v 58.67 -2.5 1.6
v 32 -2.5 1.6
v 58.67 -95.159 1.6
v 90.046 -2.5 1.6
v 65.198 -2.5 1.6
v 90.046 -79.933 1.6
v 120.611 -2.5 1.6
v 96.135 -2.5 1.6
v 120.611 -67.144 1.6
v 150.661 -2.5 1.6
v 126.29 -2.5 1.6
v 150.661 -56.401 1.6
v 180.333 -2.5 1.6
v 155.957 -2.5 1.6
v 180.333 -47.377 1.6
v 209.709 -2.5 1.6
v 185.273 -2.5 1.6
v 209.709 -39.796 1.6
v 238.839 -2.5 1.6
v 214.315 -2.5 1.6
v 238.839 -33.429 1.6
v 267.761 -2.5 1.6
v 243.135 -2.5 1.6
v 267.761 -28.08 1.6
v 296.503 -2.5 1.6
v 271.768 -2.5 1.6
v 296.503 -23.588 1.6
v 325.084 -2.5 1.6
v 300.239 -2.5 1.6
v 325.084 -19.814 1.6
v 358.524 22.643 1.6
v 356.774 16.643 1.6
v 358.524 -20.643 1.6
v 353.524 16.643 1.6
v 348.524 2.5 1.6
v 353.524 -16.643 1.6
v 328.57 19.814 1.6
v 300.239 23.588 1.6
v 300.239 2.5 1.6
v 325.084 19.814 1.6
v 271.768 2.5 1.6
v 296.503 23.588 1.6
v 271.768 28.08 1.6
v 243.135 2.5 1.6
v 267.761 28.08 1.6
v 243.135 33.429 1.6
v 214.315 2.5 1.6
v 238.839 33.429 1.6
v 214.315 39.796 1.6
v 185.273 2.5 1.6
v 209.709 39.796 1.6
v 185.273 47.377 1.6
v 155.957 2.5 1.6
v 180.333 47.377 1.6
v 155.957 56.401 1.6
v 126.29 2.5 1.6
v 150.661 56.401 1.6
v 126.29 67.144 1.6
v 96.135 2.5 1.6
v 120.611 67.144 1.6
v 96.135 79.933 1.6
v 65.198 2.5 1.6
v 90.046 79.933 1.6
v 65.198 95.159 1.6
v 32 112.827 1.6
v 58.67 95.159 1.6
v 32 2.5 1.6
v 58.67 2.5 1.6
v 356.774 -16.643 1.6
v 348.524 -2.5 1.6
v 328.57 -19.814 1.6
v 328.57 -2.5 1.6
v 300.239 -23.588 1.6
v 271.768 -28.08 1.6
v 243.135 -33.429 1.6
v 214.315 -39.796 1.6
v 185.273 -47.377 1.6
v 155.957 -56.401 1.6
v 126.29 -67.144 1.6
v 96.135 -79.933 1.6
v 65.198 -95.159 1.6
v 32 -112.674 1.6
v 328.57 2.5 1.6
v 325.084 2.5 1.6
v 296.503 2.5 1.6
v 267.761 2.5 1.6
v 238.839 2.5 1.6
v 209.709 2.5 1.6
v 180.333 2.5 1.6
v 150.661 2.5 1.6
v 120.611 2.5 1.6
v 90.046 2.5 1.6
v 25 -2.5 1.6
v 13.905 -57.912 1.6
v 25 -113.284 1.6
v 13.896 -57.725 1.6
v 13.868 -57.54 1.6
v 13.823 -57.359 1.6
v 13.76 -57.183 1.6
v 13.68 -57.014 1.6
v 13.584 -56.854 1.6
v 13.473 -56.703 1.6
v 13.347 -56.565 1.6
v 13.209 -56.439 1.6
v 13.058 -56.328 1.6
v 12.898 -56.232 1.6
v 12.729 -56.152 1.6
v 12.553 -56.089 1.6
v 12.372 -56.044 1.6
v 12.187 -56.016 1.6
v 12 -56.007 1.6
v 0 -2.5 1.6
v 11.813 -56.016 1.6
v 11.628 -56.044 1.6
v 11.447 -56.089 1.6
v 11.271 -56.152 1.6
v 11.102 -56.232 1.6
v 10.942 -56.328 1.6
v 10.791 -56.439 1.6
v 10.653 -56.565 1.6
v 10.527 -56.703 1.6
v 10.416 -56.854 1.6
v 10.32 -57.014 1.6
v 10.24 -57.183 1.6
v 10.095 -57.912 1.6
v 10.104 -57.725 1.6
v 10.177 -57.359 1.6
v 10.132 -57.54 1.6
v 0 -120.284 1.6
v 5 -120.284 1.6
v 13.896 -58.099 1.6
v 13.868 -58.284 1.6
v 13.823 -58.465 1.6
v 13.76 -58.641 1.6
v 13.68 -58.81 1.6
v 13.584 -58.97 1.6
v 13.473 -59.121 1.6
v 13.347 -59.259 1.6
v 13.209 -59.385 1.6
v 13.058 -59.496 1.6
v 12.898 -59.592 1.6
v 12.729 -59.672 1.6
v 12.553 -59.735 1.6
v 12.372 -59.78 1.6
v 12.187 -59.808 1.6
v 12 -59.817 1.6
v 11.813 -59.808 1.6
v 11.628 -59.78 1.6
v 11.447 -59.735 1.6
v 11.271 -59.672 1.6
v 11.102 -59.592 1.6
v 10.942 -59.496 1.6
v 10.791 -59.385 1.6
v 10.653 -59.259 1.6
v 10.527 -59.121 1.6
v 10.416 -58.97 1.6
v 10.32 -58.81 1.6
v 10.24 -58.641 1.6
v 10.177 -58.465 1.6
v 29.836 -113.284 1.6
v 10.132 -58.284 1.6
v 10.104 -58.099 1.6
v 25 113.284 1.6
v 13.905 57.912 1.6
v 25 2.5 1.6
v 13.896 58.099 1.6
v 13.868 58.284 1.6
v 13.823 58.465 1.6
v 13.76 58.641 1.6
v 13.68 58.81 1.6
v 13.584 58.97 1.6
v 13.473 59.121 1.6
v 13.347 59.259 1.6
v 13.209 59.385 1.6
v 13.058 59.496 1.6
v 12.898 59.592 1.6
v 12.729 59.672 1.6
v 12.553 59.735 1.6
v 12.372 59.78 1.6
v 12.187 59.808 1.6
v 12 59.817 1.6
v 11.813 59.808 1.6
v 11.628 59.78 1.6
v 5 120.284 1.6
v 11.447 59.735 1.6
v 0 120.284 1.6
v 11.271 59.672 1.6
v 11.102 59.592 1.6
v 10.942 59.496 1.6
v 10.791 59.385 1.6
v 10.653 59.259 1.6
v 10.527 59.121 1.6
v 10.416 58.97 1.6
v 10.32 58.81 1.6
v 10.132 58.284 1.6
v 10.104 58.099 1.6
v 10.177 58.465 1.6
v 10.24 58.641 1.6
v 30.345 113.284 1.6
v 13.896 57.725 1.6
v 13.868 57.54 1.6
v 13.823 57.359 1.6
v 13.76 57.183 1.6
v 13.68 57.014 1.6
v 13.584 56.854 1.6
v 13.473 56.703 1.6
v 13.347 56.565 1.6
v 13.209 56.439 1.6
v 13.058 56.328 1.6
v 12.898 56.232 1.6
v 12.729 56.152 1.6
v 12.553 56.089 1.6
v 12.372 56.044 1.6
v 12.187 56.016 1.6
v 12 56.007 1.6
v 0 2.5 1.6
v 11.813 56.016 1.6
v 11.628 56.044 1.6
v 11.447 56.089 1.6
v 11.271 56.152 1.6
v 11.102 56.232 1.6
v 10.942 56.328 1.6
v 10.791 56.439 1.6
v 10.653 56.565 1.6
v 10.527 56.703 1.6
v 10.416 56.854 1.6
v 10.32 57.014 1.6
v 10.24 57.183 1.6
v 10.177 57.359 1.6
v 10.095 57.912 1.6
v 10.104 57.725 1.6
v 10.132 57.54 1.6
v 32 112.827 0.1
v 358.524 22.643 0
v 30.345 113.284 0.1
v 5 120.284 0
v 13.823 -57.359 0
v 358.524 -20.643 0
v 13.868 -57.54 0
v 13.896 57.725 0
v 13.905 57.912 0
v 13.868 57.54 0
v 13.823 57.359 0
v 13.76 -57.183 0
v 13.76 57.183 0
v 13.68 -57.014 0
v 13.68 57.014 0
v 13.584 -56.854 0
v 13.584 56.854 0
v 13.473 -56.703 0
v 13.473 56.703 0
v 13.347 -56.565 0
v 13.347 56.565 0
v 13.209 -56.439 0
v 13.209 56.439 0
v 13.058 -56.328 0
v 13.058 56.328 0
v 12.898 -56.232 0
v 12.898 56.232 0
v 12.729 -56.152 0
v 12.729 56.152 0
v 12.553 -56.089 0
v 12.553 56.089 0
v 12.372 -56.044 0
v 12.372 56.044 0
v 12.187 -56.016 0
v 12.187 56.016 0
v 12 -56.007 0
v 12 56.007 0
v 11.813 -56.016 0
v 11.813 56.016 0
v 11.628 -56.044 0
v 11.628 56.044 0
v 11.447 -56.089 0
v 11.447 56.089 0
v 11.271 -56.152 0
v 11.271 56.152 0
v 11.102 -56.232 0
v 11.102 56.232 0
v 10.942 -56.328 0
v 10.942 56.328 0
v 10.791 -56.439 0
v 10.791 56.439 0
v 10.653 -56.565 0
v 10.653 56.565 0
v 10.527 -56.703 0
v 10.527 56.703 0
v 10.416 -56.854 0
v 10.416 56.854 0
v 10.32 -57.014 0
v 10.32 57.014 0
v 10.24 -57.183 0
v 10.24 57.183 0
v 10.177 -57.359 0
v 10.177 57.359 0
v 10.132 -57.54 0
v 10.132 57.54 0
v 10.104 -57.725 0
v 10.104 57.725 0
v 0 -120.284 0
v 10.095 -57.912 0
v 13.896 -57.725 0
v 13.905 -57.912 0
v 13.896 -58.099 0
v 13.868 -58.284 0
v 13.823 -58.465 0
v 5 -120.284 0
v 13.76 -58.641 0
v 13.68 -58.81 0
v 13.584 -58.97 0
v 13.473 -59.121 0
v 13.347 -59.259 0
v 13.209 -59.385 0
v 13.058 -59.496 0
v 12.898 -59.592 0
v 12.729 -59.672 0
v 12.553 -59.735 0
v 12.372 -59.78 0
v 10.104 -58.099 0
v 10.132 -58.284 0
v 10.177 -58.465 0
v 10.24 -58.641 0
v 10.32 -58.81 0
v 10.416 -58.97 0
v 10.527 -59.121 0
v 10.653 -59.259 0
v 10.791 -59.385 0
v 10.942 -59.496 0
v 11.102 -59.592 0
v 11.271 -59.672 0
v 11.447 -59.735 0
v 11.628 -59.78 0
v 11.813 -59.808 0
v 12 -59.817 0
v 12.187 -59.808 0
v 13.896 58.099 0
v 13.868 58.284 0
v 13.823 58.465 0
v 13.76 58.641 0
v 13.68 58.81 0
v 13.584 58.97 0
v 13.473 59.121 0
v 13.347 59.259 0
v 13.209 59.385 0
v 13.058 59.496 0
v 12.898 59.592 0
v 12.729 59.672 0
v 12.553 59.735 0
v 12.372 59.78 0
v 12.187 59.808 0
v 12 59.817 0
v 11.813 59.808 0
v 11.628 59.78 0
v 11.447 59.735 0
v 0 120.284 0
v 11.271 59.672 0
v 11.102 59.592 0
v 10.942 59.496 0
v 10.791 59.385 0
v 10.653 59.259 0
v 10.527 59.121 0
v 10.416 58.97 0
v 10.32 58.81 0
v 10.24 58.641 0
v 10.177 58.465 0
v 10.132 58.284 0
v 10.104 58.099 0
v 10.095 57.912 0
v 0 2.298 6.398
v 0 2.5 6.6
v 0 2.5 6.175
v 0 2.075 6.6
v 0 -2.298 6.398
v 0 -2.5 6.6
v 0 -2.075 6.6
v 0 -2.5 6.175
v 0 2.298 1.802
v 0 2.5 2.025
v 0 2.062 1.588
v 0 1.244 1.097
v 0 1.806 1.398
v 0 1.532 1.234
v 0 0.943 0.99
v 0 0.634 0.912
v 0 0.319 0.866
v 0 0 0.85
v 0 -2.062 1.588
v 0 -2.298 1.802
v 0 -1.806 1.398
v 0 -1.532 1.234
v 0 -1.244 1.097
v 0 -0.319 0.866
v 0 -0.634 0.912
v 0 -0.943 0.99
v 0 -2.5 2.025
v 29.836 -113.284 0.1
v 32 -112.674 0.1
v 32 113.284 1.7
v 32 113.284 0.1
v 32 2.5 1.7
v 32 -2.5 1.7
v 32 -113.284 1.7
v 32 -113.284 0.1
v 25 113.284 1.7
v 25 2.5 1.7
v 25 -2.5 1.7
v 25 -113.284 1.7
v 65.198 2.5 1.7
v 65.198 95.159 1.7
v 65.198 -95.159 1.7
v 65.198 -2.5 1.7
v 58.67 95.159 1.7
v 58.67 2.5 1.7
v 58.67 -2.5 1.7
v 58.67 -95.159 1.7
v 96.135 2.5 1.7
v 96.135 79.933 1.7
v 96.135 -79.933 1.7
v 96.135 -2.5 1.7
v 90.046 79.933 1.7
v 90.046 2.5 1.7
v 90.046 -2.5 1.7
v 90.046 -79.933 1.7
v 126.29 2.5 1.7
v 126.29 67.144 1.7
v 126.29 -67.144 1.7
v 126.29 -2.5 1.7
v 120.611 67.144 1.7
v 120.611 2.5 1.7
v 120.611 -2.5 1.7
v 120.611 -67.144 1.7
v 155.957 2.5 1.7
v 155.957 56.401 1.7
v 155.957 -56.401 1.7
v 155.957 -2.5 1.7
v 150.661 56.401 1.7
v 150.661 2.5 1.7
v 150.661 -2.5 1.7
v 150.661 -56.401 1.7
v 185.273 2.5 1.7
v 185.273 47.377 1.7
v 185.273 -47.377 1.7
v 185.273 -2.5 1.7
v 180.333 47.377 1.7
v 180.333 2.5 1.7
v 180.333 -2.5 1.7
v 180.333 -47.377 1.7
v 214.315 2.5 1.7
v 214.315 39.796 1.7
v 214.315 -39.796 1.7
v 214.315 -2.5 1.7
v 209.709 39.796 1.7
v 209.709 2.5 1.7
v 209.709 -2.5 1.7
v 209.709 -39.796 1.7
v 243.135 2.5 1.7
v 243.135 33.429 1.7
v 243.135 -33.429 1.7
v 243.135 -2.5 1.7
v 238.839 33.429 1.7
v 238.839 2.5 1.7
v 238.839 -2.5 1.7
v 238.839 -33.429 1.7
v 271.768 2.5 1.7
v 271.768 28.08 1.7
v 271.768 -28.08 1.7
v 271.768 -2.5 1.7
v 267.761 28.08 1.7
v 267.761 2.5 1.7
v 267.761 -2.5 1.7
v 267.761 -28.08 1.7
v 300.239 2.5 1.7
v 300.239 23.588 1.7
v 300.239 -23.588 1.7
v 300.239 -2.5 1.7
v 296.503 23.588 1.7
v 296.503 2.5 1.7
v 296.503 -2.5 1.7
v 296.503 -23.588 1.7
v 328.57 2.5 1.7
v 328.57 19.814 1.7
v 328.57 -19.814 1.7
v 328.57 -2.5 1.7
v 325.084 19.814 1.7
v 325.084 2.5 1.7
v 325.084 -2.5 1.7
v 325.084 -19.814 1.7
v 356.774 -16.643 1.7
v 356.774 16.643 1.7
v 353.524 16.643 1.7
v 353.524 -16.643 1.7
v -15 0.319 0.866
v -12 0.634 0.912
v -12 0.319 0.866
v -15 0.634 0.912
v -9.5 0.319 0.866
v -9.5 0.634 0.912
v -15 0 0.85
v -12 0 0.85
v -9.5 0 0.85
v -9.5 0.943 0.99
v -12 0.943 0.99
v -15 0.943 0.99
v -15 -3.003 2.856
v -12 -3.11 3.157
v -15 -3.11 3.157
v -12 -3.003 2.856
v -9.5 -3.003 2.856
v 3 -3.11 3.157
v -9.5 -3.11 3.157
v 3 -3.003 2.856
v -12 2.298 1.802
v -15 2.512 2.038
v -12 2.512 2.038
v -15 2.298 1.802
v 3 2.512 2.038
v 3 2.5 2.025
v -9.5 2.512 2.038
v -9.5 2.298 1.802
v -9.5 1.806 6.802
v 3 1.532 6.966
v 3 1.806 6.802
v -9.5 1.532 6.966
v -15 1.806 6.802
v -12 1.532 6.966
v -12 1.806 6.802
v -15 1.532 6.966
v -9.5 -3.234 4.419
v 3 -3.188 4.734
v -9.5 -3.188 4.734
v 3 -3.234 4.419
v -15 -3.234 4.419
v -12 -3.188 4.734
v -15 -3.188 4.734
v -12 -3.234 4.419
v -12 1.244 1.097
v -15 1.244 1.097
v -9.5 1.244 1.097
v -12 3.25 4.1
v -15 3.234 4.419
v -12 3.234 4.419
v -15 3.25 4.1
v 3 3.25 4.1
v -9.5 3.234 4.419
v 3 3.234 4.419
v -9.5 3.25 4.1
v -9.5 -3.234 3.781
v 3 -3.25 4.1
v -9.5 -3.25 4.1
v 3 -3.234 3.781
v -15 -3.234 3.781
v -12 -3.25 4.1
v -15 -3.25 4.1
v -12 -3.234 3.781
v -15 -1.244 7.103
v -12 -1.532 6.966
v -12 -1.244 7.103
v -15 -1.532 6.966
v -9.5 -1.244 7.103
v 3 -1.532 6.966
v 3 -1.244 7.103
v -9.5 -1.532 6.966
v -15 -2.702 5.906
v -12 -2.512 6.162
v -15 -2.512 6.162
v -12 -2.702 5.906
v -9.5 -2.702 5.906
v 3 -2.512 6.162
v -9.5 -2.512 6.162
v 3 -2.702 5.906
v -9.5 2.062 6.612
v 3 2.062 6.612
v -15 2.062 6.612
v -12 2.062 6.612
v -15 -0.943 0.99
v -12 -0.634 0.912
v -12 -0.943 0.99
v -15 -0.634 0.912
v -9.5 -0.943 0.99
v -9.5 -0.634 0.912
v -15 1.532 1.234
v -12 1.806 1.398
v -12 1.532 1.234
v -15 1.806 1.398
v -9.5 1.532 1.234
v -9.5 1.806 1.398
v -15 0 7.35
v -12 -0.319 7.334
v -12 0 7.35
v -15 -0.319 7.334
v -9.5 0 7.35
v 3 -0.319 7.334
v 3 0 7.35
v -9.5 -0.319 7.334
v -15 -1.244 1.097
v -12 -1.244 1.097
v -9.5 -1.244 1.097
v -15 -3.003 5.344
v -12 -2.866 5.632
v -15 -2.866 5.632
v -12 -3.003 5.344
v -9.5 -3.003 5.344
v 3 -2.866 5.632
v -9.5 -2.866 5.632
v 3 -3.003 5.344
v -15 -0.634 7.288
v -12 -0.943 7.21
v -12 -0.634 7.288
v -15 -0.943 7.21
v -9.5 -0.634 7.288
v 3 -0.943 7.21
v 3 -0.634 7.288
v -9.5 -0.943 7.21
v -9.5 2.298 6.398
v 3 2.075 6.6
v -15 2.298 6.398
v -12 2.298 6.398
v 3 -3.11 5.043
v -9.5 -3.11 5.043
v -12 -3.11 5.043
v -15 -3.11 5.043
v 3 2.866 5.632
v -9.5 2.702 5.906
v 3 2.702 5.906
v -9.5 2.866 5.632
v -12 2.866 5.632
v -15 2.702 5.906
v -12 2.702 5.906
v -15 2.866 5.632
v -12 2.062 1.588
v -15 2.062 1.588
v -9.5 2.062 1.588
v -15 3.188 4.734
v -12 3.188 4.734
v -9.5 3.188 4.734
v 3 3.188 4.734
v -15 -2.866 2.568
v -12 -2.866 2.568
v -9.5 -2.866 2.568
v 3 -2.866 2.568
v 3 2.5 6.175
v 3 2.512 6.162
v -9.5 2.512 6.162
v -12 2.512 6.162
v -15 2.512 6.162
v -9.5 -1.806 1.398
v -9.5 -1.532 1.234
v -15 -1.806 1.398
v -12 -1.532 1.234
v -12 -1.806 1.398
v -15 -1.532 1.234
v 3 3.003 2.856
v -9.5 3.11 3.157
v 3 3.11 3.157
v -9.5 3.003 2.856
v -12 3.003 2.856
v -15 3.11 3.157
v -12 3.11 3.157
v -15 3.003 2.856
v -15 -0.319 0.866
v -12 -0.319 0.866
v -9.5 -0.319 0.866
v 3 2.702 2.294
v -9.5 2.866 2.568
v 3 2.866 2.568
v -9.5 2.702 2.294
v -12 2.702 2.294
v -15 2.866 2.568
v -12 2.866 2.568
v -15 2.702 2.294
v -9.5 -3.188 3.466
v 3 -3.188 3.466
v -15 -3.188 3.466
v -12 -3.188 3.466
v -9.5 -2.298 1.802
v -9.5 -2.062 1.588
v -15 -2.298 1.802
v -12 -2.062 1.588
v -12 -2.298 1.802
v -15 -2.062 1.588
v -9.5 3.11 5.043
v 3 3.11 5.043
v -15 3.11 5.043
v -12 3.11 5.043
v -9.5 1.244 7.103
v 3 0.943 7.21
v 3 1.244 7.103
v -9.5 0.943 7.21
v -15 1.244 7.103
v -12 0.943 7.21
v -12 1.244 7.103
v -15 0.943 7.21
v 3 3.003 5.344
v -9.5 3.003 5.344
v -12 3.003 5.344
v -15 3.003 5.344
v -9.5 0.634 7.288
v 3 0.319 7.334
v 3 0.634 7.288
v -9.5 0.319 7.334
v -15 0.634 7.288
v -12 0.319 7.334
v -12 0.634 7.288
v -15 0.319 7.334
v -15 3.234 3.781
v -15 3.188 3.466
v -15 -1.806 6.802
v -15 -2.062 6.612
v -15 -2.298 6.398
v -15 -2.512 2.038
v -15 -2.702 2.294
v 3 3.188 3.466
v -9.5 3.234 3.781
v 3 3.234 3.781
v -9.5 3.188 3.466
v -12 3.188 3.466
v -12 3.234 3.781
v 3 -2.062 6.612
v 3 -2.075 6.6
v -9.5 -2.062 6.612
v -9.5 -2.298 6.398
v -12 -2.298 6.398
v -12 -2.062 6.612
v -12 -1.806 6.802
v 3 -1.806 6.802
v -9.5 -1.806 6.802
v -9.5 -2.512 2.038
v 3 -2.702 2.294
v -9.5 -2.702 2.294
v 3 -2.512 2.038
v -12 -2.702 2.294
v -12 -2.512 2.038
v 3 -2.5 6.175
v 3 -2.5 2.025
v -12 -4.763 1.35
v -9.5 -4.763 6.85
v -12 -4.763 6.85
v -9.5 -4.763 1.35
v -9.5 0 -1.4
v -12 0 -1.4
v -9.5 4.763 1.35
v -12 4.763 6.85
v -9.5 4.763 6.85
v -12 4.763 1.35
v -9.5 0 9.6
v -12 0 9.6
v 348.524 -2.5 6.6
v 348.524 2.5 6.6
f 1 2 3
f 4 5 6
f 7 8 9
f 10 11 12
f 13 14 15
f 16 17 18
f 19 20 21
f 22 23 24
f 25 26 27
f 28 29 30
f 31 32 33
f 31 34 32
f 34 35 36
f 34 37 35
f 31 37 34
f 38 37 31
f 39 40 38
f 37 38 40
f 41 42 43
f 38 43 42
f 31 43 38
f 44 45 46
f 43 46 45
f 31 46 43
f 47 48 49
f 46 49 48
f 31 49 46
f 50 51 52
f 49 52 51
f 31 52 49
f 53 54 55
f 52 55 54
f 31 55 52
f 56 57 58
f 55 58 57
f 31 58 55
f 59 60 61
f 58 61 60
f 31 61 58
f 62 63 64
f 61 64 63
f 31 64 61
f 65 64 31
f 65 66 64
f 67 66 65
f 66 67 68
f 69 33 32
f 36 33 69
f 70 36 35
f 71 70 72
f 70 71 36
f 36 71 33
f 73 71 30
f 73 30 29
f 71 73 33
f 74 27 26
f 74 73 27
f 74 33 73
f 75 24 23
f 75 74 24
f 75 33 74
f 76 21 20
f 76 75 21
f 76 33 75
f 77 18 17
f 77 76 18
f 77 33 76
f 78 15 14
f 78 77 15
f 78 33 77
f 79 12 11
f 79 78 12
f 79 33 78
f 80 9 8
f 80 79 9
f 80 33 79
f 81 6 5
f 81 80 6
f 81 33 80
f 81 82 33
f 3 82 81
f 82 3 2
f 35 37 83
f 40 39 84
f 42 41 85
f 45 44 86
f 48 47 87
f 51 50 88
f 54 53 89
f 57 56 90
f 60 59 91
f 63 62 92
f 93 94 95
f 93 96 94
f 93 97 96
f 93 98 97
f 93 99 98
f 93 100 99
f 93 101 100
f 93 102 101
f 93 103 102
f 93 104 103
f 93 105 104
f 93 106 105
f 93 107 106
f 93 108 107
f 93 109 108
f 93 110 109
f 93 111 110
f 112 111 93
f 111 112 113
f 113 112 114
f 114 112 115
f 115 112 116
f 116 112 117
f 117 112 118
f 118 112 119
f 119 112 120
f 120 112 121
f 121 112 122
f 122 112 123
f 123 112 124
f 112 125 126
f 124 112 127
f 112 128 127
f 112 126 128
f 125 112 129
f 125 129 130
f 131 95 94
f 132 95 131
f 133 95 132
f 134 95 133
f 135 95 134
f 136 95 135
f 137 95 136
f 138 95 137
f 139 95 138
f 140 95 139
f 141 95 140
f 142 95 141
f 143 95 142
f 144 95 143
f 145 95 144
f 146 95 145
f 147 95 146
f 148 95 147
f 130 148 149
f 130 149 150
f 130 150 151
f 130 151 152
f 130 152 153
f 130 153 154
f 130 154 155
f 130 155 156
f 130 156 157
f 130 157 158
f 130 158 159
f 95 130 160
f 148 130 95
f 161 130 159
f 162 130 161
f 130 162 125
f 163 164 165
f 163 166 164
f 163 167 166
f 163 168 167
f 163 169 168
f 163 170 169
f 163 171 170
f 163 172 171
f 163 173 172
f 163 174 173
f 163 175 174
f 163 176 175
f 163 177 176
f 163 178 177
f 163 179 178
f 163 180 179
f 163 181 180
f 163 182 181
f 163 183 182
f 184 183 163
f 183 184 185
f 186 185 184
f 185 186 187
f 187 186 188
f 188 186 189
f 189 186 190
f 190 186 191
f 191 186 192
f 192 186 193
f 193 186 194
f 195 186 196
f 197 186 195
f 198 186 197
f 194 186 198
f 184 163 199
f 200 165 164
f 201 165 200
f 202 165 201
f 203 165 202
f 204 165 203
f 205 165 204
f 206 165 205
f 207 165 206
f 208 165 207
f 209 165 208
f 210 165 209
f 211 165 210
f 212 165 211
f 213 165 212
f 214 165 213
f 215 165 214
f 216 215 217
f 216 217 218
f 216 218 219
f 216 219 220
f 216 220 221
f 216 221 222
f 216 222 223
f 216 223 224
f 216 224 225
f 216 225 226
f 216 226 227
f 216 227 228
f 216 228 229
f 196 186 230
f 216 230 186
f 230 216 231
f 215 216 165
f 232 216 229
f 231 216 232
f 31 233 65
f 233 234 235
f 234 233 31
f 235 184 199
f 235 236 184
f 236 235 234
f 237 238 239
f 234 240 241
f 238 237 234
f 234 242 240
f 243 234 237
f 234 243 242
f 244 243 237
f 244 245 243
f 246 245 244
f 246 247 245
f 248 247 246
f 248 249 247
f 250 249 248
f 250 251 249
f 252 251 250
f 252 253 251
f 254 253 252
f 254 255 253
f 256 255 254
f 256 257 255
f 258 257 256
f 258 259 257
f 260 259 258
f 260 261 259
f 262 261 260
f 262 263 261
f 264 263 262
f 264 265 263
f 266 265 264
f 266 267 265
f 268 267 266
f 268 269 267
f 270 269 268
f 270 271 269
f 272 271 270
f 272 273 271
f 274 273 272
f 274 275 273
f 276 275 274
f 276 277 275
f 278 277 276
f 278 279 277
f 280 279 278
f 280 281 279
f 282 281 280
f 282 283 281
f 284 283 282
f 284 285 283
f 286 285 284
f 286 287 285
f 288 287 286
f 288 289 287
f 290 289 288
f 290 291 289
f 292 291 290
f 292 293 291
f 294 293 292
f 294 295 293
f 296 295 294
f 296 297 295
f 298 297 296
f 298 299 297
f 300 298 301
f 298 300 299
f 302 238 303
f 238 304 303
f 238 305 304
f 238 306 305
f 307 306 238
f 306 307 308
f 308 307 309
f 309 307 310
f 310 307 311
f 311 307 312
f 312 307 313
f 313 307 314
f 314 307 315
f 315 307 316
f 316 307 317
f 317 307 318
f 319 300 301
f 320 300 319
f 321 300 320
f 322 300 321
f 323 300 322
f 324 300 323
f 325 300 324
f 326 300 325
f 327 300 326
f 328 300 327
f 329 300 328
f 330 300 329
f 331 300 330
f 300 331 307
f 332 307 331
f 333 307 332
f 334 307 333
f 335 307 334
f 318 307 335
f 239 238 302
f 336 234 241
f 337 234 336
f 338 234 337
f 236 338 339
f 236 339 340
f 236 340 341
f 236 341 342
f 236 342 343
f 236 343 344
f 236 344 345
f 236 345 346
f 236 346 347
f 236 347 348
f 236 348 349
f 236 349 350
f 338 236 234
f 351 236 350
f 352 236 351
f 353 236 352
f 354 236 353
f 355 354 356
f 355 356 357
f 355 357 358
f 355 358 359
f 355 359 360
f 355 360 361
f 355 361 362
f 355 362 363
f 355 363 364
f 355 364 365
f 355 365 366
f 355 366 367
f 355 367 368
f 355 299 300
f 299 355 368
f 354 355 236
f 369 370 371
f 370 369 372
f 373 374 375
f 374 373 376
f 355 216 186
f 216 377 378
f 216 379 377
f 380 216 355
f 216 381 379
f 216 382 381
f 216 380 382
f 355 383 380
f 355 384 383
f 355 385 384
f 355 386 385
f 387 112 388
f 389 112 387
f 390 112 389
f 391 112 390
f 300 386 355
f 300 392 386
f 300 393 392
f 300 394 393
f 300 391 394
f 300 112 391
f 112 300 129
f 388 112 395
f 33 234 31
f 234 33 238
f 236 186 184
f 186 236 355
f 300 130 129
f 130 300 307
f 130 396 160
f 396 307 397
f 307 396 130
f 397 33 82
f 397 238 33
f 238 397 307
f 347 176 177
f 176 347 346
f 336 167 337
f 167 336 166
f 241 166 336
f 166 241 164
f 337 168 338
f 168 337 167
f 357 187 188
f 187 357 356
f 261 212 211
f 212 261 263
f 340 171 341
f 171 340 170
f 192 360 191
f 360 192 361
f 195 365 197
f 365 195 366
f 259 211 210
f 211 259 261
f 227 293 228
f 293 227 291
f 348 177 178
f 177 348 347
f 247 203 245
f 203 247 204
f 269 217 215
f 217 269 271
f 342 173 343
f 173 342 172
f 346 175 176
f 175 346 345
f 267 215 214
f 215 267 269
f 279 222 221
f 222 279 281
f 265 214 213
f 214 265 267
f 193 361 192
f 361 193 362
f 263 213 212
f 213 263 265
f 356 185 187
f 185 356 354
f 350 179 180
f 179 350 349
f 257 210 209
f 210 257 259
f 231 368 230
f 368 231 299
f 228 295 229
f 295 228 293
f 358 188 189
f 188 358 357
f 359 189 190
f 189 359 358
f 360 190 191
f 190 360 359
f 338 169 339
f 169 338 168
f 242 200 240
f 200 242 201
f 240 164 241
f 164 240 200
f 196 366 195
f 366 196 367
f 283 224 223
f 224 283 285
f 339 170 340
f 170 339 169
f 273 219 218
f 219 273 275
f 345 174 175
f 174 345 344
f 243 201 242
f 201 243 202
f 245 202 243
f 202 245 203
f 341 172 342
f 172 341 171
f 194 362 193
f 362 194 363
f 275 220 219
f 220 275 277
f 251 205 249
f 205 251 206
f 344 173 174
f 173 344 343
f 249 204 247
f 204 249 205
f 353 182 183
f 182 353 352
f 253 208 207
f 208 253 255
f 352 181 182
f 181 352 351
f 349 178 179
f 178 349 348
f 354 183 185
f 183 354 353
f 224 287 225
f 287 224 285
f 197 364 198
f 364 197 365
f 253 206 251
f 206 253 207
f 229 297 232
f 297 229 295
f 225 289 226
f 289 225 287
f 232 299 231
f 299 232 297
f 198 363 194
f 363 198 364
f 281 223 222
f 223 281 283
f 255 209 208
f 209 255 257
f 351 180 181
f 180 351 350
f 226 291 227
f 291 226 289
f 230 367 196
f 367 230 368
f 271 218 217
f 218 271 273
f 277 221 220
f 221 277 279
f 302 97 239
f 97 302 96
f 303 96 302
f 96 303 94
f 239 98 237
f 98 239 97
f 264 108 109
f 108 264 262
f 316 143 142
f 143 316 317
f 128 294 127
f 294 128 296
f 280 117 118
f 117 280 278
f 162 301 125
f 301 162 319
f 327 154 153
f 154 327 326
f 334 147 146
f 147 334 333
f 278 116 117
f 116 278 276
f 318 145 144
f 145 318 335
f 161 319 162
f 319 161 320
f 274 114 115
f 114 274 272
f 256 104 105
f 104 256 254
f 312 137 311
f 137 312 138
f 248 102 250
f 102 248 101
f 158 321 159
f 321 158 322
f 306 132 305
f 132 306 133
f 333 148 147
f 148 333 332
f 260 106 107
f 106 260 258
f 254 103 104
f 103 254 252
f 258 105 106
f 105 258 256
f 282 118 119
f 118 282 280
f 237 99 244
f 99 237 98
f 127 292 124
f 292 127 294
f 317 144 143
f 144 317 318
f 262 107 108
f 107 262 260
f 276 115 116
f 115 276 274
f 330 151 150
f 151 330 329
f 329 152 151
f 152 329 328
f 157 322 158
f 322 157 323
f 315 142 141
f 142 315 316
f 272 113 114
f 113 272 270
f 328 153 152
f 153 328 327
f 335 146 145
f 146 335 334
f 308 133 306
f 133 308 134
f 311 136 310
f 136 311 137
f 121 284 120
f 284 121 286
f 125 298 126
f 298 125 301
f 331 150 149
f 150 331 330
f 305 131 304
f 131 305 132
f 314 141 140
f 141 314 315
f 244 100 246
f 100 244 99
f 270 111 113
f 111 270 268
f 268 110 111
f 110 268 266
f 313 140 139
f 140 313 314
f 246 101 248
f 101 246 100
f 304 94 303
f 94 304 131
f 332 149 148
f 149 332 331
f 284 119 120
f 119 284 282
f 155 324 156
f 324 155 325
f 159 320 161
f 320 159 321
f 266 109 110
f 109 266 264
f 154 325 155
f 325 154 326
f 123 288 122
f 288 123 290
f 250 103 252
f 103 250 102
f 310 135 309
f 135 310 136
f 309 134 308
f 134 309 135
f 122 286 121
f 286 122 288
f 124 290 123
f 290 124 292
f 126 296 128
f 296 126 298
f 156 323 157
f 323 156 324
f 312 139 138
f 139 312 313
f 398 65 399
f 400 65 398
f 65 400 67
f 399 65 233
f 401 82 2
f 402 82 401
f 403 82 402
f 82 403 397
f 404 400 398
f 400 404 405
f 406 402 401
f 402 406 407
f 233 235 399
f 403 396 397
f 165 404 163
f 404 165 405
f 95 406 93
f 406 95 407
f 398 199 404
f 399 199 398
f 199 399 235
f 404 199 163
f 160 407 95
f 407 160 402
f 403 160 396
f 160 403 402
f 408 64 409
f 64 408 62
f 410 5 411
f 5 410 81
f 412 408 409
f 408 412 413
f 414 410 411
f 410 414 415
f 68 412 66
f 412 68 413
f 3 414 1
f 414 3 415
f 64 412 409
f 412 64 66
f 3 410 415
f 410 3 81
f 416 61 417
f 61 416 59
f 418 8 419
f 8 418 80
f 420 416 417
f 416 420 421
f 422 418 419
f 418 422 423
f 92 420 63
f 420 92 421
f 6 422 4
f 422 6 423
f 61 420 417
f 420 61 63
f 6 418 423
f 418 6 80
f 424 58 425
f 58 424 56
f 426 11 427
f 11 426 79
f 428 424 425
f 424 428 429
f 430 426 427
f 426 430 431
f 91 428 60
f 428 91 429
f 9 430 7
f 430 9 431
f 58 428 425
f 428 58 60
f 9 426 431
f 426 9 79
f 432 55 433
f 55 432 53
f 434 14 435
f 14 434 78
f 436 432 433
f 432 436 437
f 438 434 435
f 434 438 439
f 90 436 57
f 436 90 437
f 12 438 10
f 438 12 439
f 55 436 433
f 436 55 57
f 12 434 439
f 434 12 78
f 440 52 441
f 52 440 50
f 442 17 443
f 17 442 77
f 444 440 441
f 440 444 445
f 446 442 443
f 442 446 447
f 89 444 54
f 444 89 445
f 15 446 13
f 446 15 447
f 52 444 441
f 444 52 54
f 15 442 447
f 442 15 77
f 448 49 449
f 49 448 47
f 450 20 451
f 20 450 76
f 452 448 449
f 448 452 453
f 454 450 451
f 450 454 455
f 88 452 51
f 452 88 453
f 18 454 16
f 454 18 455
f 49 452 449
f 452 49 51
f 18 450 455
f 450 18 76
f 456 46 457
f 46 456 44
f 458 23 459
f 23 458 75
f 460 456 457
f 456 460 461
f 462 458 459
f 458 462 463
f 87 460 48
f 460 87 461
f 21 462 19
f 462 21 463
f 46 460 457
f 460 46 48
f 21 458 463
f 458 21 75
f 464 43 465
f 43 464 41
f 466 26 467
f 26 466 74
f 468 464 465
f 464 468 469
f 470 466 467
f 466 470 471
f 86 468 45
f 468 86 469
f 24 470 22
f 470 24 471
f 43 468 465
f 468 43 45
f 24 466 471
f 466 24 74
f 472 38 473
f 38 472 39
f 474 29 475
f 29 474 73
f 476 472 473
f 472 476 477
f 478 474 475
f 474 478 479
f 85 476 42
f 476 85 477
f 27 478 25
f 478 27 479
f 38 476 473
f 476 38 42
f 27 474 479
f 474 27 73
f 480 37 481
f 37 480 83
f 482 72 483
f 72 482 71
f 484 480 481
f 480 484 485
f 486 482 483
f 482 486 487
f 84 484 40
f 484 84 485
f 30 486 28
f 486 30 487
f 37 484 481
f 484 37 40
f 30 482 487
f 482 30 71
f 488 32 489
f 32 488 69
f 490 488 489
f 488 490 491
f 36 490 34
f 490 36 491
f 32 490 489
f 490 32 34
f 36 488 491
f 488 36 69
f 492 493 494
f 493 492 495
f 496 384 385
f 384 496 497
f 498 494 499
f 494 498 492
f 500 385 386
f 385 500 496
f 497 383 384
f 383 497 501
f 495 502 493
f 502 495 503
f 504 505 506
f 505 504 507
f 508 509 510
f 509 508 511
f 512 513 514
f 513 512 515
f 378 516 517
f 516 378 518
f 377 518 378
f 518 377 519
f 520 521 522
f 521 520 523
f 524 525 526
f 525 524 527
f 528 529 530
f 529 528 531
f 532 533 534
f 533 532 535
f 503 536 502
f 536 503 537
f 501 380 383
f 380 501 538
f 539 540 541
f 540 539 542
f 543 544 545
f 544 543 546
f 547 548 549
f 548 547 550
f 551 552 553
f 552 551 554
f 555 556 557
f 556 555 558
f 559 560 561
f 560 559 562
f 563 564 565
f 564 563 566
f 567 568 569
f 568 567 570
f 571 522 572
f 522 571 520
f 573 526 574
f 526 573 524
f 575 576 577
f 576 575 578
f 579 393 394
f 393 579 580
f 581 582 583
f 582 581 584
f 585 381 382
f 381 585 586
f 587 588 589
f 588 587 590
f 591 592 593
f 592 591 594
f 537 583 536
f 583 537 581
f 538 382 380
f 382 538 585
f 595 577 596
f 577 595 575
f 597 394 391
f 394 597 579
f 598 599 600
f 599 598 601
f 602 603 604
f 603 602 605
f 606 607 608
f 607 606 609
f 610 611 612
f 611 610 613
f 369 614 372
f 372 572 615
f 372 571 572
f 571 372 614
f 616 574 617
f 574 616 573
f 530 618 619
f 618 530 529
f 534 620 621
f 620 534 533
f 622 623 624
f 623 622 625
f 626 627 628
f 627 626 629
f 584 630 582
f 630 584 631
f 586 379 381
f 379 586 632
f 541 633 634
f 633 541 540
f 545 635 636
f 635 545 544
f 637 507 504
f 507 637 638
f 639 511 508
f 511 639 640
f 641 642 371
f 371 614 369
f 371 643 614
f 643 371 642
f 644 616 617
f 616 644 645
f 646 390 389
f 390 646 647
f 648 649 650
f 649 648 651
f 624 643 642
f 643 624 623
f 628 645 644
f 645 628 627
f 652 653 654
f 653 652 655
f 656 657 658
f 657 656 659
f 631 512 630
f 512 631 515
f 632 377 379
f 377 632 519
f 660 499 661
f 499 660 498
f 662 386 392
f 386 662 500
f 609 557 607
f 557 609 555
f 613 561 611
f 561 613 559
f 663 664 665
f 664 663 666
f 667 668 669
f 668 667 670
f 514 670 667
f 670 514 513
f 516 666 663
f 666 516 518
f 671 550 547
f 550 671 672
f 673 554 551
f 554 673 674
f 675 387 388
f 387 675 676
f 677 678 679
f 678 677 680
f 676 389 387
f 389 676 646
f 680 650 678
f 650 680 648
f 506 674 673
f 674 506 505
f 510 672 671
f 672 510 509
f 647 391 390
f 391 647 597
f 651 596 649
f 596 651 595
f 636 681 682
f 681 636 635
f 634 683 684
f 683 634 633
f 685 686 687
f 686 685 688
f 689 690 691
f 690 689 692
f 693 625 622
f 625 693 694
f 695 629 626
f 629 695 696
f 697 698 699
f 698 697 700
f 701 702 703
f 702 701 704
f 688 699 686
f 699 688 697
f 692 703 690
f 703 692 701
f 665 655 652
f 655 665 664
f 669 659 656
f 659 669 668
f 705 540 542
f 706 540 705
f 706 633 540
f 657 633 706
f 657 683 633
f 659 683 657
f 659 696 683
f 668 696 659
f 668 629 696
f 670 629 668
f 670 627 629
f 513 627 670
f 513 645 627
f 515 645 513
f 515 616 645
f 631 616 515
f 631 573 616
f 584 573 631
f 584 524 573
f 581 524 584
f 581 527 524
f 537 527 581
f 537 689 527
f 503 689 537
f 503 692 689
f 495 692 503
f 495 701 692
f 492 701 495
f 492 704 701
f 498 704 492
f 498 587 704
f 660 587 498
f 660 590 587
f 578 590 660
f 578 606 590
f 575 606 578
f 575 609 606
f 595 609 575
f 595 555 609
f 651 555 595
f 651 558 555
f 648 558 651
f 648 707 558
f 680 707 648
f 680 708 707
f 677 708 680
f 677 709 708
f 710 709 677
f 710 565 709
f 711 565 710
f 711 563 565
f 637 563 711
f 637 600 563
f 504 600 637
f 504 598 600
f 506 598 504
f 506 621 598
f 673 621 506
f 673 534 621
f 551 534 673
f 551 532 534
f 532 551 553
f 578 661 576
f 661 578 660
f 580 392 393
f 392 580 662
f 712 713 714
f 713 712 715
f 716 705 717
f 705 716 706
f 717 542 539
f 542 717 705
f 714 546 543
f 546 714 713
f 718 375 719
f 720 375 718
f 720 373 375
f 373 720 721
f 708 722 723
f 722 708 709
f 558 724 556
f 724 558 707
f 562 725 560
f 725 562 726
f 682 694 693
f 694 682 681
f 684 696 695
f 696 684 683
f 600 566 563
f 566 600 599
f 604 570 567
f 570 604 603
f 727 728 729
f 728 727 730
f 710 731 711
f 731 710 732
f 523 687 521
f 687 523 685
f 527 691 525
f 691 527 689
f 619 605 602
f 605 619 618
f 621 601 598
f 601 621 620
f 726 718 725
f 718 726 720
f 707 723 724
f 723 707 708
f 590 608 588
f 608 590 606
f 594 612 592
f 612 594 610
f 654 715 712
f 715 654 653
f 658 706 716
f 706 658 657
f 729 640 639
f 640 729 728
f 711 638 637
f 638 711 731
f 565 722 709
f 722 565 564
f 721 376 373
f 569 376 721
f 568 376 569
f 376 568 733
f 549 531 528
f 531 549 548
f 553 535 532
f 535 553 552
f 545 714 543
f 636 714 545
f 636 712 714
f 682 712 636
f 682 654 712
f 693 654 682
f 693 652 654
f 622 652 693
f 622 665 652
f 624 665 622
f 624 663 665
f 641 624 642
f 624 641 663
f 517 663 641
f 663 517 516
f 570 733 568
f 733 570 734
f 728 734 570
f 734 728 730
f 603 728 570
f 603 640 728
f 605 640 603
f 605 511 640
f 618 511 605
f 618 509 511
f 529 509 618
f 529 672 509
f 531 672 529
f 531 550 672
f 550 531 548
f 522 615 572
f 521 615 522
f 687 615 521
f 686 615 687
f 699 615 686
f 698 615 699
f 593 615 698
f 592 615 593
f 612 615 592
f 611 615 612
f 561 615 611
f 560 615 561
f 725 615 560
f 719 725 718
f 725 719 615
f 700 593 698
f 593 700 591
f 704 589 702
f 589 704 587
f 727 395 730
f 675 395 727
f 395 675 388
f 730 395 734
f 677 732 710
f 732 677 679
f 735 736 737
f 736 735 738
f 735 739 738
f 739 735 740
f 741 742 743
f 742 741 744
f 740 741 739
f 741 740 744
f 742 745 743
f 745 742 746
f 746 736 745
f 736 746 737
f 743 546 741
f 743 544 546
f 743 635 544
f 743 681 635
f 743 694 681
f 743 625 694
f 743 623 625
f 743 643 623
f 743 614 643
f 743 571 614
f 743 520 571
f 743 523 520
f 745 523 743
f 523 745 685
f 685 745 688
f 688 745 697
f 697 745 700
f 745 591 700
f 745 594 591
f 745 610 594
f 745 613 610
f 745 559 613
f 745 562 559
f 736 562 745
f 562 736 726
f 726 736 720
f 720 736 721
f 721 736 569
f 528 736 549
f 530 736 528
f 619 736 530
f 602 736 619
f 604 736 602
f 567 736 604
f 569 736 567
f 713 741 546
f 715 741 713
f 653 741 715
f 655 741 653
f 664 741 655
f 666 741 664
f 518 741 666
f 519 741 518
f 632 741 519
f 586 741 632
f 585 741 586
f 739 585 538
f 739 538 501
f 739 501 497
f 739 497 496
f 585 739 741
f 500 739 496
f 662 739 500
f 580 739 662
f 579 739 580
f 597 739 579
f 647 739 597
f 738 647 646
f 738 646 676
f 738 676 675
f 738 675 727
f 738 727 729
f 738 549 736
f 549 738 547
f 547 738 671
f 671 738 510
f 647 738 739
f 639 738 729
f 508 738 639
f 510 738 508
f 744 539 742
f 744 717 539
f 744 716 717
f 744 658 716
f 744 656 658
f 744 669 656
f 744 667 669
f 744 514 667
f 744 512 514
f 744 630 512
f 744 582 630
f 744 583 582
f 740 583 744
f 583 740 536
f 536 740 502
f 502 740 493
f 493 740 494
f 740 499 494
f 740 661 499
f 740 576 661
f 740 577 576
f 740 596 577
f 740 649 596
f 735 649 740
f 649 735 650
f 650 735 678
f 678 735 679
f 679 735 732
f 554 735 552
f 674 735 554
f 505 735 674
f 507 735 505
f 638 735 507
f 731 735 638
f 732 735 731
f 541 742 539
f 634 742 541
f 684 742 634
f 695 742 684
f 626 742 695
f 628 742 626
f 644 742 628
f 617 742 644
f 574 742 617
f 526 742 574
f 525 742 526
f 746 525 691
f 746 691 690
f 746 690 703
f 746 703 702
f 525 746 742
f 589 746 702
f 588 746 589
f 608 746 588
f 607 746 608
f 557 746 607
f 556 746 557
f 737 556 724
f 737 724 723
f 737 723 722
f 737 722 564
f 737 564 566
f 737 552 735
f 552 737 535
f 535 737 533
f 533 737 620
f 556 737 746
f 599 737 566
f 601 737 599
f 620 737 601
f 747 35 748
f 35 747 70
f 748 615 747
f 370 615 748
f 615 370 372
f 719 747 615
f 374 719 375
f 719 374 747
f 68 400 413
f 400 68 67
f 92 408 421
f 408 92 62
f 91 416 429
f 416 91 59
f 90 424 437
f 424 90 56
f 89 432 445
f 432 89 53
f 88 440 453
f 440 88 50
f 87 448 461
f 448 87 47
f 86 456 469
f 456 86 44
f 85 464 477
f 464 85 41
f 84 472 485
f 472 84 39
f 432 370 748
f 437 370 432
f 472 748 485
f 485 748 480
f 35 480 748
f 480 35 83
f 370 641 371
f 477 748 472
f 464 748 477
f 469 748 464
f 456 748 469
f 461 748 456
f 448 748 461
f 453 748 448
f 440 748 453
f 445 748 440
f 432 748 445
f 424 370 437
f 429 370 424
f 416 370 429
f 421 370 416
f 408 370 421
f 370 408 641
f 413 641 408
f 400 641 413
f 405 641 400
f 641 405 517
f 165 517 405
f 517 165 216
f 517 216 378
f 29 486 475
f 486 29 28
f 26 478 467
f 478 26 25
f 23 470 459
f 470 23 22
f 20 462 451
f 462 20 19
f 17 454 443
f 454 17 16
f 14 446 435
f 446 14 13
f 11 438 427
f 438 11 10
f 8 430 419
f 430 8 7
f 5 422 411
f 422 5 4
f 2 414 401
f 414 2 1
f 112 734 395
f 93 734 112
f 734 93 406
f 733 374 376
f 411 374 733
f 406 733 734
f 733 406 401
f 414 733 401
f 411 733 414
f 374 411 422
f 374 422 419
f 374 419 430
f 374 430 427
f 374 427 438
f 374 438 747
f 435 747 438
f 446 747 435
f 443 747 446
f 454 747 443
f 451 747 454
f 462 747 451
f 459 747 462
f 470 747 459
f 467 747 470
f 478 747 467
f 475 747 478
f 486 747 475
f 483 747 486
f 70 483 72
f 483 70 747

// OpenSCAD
// FILE: 05_Directional_Antenna_PCB_Standalone.scad
// Reference: Final PCB Design with 4.56" hole spacing.

$fn = 64;
mm = 25.4;

widest_len = 8.92 * mm; 
hole_dist  = 4.56 * mm;
hole_dia   = 0.15 * mm;
pcb_thick  = 1.6; 
margin     = 7; 
num_elements = 12;  
tau = 0.84;          
antenna_span = widest_len * 1.45; 

union() {
    difference() {
        // Substrate
        color("DarkGreen") hull() {
            translate([0, -(widest_len/2 + margin), 0]) cube([5, widest_len + 14, pcb_thick]);
            final_L = widest_len * pow(tau, num_elements - 1);
            translate([antenna_span + 25, -(final_L/2 + 4), 0]) cube([5, final_L + 10, pcb_thick]);
        }
        // Mounting Holes (at X=12mm)
        translate([12, hole_dist/2, -1])  cylinder(h=pcb_thick + 5, d=hole_dia);
        translate([12, -hole_dist/2, -1]) cylinder(h=pcb_thick + 5, d=hole_dia);
    }
    // Copper Elements
    color("DarkSeaGreen") for (i = [0 : num_elements - 1]) {
        L = widest_len * pow(tau, i);
        pos_x = 25 + (antenna_span * pow(i/(num_elements-1), 0.95));
        element_w = 7 * pow(tau, i*0.4); 
        translate([pos_x, -L/2, 0.1]) cube([element_w, L, pcb_thick]);
    }
    // Boom and SMA
    translate([0, -2.5, pcb_thick]) color("Silver") cube([antenna_span + 20, 5, 5]);
    translate([-15, 0, pcb_thick + 2.5]) rotate([0, 90, 0]) color("Gold") {
            cylinder(h=18, d=6.5);
            translate([0,0,3]) cylinder(h=2.5, d=11, $fn=6); 
    }
}
